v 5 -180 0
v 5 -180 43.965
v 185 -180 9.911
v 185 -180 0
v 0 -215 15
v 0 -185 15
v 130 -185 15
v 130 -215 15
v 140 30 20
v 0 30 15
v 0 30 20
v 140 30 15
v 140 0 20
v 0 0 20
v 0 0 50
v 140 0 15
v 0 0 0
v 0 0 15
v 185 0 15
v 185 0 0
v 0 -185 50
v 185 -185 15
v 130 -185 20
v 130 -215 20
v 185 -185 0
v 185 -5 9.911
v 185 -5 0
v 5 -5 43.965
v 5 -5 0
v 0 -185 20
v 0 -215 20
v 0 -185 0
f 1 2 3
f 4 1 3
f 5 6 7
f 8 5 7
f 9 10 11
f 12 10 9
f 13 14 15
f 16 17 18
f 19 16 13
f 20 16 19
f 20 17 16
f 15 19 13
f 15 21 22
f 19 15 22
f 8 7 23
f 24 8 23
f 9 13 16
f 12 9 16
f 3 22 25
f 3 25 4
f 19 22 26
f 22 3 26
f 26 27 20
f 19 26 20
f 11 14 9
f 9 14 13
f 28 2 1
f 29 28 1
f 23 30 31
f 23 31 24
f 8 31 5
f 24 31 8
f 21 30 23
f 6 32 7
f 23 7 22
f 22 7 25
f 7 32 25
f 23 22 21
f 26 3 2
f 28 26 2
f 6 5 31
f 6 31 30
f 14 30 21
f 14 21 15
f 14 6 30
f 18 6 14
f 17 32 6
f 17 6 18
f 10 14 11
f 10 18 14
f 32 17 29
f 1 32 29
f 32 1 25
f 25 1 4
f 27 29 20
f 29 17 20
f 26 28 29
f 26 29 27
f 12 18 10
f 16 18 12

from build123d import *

# Parameters (mm, degrees)
SKETCH1_W           = 185
SKETCH1_H           = 185
BOSS_EXTRUDE1_DEPTH = 50
CUT_EXTRUDE1_DEPTH  = 190
CUT_EXTRUDE3_START  = -5
CUT_EXTRUDE3_DEPTH  = 175
SKETCH10_W          = 130
SKETCH10_H          = 5
BOSS_EXTRUDE2_DEPTH = 30
SKETCH11_W          = 140
SKETCH11_H          = 5
BOSS_EXTRUDE3_DEPTH = 30


with BuildPart() as part:
    # Sketch1 → Boss-Extrude1 (new body)
    with BuildSketch(Plane.XY):
        with Locations((92.5, -92.5)):
            Rectangle(SKETCH1_W, SKETCH1_H)
    extrude(amount=BOSS_EXTRUDE1_DEPTH)

    # Sketch8 → Cut-Extrude1 (cut)
    with BuildSketch(Plane.XZ.offset(185)):
        Polygon((0, 50), (185, 15), (185, 50), align=None)
    extrude(amount=-CUT_EXTRUDE1_DEPTH, mode=Mode.SUBTRACT)

    # Sketch9 → Cut-Extrude3 (cut)
    with BuildSketch(Plane.XZ.offset(185).offset(CUT_EXTRUDE3_START)):
        Polygon((185, 9.911305302), (5, 43.965359356), (5, 0), (185, 0), align=None)
    extrude(amount=-CUT_EXTRUDE3_DEPTH, mode=Mode.SUBTRACT)

    # Sketch10 → Boss-Extrude2 (add)
    with BuildSketch(Plane.XZ.offset(185)):
        with Locations((65, 17.5)):
            Rectangle(SKETCH10_W, SKETCH10_H)
    extrude(amount=BOSS_EXTRUDE2_DEPTH)

    # Sketch11 → Boss-Extrude3 (add)
    with BuildSketch(Plane(origin=(0, 0, 0), x_dir=(1, 0, 0), z_dir=(0, 1, 0))):
        with Locations((70, -17.5)):
            Rectangle(SKETCH11_W, SKETCH11_H)
    extrude(amount=BOSS_EXTRUDE3_DEPTH)


solid = part.part
